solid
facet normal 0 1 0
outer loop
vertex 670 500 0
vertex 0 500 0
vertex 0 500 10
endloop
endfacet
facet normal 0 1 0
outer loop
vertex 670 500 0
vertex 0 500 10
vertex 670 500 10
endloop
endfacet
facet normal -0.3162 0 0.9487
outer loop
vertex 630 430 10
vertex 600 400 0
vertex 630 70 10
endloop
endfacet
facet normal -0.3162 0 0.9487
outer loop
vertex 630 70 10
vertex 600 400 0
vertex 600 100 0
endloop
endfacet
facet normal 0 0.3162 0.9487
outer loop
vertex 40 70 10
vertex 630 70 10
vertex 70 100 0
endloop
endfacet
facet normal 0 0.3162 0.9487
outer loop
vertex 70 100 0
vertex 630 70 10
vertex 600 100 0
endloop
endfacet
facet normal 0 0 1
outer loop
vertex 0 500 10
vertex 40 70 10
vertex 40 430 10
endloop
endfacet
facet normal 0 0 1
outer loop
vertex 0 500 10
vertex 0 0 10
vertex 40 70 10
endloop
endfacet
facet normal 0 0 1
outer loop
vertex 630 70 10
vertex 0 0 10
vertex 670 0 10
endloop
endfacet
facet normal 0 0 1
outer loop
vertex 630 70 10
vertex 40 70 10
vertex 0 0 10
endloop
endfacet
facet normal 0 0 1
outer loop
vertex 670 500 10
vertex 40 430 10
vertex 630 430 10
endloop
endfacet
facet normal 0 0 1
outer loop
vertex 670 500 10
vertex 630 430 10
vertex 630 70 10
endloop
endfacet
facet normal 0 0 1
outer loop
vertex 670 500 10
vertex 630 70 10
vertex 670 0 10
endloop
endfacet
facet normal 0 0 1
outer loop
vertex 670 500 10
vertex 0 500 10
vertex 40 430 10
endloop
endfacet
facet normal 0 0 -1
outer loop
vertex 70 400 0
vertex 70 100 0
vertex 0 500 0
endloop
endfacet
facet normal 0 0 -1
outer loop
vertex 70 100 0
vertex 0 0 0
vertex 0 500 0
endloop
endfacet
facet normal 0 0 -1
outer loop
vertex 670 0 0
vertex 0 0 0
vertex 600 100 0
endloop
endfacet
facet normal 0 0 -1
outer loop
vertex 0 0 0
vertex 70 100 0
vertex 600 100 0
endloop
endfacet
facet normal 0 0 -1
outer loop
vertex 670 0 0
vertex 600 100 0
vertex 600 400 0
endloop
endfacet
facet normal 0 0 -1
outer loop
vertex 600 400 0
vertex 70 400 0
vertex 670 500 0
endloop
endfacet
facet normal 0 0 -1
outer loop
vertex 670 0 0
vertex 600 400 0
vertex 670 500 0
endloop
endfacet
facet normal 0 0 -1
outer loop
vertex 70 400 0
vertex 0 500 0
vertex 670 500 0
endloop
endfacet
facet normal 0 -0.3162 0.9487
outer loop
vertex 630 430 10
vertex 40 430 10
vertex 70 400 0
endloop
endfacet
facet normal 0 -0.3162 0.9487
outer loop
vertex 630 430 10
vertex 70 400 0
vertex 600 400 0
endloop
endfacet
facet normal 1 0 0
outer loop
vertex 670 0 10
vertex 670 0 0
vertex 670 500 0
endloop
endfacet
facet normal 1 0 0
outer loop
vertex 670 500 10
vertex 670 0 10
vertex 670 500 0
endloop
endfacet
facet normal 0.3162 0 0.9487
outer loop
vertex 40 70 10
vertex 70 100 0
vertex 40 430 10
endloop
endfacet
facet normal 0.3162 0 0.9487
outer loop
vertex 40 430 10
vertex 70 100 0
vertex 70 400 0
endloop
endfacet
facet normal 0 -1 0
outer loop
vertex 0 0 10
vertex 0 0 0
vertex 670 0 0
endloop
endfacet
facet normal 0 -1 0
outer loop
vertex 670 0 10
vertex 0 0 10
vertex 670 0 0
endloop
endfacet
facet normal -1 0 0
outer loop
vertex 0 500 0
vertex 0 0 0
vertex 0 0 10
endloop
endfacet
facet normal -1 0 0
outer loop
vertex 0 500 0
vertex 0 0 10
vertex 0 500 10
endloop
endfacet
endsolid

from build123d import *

# Parameters (mm, degrees)
SKETCH1_W      = 670
SKETCH1_H      = 500
SKETCH1_W_2    = 530
SKETCH1_H_2    = 300
EXTRUDE1_DEPTH = 10
CHAMFER1_SIZE2 = 30
CHAMFER1_SIZE  = 10
CHAMFER2_SIZE2 = 10
CHAMFER2_SIZE  = 30
CHAMFER3_SIZE2 = 30
CHAMFER3_SIZE  = 10
CHAMFER4_SIZE2 = 10
CHAMFER4_SIZE  = 30


with BuildPart() as part:
    # Sketch1 → Extrude1 (new body)
    with BuildSketch(Plane.XY):
        with Locations((335, 250)):
            Rectangle(SKETCH1_W, SKETCH1_H)
        with Locations((335, 250)):
            Rectangle(SKETCH1_W_2, SKETCH1_H_2, mode=Mode.SUBTRACT)
    extrude(amount=EXTRUDE1_DEPTH)

    # Chamfer1
    chamfer1_edges = [part.edges().sort_by_distance(p)[0] for p in [
        (335, 400, 10),
    ]]
    chamfer1_side = [part.faces().sort_by_distance(p)[0] for p in [
        (335, 400, 9.8),
    ]]
    chamfer(chamfer1_edges, length=CHAMFER1_SIZE - 0.0001, length2=CHAMFER1_SIZE2 - 0.0001, reference=chamfer1_side[0])  # a hair under: the kernel refuses the full size

    # Chamfer2
    chamfer2_edges = [part.edges().sort_by_distance(p)[0] for p in [
        (70, 264.99995, 10),
    ]]
    chamfer2_side = [part.faces().sort_by_distance(p)[0] for p in [
        (69.8, 264.99995, 10),
    ]]
    chamfer(chamfer2_edges, length=CHAMFER2_SIZE - 0.0001, length2=CHAMFER2_SIZE2 - 0.0001, reference=chamfer2_side[0])  # a hair under: the kernel refuses the full size

    # Chamfer3
    chamfer3_edges = [part.edges().sort_by_distance(p)[0] for p in [
        (320.00005, 100, 10),
    ]]
    chamfer3_side = [part.faces().sort_by_distance(p)[0] for p in [
        (320.00005, 100, 9.8),
    ]]
    chamfer(chamfer3_edges, length=CHAMFER3_SIZE - 0.0001, length2=CHAMFER3_SIZE2 - 0.0001, reference=chamfer3_side[0])  # a hair under: the kernel refuses the full size

    # Chamfer4
    chamfer4_edges = [part.edges().sort_by_distance(p)[0] for p in [
        (600, 250, 10),
    ]]
    chamfer4_side = [part.faces().sort_by_distance(p)[0] for p in [
        (600.2, 250, 10),
    ]]
    chamfer(chamfer4_edges, length=CHAMFER4_SIZE - 0.0001, length2=CHAMFER4_SIZE2 - 0.0001, reference=chamfer4_side[0])  # a hair under: the kernel refuses the full size


solid = part.part
